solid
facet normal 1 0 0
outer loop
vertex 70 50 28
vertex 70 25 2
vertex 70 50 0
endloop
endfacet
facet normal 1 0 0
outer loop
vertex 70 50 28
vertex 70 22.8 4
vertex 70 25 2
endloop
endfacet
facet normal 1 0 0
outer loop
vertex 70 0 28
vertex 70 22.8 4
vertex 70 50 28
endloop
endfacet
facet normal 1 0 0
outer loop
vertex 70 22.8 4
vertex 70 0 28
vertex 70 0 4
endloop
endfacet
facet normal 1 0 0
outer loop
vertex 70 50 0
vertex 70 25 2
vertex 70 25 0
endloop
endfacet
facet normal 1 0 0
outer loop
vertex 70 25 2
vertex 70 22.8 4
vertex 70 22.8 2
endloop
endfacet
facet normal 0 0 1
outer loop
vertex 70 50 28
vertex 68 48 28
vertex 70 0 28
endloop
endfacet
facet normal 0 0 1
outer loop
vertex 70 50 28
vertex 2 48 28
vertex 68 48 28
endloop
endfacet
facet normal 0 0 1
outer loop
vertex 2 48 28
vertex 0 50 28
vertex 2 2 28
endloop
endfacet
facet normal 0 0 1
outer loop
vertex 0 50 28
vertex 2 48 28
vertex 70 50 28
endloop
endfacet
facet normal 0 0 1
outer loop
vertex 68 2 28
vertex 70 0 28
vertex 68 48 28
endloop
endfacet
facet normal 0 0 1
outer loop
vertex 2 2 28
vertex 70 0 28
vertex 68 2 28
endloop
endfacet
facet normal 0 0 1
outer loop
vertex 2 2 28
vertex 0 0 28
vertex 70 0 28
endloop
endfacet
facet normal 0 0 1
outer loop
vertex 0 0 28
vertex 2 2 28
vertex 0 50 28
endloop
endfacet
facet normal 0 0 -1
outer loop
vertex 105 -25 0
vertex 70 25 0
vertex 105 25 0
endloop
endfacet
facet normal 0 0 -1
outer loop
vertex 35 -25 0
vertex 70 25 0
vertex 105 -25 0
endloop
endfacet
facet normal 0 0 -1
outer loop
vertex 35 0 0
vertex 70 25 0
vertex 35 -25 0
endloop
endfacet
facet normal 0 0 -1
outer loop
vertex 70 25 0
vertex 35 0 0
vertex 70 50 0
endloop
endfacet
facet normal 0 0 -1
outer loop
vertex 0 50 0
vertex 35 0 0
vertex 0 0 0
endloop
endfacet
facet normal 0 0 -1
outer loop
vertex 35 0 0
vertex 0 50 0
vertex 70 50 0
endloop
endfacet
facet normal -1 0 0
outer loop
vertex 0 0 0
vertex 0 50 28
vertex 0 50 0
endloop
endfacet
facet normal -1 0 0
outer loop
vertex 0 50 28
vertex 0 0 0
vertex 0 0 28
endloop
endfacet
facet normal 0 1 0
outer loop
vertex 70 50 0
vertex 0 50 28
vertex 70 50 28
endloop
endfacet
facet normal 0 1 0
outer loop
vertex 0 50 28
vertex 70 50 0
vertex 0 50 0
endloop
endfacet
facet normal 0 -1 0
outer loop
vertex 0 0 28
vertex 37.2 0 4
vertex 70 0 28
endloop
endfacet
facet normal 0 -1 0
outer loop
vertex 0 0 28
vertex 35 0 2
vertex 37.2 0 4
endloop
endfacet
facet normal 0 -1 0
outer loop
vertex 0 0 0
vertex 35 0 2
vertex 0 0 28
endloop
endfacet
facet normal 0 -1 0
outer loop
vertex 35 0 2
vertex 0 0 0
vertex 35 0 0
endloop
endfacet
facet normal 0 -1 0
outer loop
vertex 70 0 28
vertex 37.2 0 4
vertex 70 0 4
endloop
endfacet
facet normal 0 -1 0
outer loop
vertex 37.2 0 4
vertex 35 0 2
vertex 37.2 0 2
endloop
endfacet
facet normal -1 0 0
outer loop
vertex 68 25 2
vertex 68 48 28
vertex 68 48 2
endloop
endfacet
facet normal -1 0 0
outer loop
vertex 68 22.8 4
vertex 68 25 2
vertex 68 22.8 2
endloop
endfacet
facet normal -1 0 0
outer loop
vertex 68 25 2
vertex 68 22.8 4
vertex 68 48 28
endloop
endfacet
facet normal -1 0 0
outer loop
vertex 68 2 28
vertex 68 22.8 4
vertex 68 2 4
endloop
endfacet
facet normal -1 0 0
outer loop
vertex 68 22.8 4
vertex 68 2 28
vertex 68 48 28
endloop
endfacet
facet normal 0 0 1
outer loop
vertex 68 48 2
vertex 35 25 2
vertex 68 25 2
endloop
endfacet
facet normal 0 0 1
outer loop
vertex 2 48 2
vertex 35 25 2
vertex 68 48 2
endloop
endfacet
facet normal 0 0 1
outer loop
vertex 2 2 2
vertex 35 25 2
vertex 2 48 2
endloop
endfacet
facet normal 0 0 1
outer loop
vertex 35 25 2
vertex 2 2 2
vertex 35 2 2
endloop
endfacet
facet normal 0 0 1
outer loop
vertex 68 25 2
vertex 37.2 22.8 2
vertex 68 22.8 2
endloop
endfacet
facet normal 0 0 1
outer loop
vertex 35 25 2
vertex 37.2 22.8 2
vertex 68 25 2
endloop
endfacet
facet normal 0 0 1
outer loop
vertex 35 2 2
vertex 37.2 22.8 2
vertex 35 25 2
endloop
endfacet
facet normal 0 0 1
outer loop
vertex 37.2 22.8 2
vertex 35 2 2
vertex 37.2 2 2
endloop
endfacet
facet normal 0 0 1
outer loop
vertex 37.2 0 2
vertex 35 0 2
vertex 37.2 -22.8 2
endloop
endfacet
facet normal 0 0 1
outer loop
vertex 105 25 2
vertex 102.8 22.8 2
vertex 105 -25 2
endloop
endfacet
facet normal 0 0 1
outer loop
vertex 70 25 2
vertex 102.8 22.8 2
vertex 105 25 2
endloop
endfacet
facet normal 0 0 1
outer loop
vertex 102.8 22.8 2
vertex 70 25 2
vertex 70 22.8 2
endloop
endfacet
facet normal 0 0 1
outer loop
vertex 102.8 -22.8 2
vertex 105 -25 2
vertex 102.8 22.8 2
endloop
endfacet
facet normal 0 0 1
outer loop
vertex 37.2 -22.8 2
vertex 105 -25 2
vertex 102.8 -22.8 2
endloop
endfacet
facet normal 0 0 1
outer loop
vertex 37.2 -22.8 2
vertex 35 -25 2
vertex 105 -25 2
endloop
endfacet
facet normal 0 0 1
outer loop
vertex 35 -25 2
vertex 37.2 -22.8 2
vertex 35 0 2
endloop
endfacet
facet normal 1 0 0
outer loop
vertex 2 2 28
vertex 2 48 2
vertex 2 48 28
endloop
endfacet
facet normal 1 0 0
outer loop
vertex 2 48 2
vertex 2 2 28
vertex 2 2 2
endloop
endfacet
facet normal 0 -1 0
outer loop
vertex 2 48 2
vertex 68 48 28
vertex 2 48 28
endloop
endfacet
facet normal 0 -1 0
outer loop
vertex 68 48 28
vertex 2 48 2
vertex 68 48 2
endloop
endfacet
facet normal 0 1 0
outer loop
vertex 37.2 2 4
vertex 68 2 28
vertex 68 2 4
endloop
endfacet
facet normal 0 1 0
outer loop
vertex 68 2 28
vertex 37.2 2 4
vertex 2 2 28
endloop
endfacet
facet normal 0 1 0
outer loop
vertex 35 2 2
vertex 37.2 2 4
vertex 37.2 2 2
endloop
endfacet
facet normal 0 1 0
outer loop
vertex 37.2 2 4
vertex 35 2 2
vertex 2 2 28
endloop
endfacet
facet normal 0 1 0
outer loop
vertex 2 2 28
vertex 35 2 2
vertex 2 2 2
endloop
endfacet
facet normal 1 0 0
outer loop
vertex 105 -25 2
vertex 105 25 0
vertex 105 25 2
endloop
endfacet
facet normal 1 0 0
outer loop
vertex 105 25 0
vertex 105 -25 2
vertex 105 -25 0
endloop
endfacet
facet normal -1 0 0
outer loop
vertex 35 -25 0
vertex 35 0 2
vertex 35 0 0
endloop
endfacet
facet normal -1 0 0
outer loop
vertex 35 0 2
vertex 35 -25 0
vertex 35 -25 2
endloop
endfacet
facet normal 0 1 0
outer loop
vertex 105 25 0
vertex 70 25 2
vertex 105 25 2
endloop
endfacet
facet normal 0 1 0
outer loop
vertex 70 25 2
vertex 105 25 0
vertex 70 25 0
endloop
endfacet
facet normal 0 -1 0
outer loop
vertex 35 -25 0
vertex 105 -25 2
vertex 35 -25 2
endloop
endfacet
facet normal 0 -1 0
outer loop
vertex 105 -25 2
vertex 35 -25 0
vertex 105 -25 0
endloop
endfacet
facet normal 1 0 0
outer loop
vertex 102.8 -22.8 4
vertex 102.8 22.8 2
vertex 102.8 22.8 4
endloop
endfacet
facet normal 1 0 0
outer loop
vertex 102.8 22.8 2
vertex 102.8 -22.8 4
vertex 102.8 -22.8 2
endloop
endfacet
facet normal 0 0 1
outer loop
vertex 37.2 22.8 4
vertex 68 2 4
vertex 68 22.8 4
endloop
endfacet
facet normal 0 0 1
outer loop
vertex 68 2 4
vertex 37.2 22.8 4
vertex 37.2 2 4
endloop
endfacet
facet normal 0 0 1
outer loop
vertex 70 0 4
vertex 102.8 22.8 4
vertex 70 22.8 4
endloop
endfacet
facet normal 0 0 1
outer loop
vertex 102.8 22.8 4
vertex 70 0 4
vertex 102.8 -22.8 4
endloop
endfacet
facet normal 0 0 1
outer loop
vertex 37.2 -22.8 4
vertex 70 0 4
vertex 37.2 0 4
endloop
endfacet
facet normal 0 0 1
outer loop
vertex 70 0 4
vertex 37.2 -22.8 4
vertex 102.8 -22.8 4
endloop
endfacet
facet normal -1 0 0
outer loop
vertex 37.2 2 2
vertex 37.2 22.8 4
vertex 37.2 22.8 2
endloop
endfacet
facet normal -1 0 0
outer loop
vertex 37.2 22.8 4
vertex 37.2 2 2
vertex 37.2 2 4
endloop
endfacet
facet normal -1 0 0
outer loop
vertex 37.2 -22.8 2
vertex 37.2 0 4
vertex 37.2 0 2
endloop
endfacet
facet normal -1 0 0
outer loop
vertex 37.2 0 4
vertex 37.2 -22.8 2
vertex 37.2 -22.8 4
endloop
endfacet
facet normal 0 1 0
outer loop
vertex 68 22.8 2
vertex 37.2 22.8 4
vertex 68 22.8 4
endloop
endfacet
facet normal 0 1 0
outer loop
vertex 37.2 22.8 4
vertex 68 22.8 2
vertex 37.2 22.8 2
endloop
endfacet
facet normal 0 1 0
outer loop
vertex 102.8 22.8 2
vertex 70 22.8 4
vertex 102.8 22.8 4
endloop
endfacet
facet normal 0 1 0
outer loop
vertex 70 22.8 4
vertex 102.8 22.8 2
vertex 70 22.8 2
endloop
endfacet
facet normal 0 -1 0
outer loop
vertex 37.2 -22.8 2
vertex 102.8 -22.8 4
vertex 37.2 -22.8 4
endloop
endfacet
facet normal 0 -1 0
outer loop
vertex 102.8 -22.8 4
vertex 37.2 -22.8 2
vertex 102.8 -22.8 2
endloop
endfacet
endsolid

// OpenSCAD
// Two-part enclosure for a small electronics board (e.g. Arduino-based temperature logger)
// Print orientation: box standing on its floor, lid printed upside down on the +X side.
// Both parts are in the same file, side by side on the bed, with a 10 mm gap between them.

// ---------------- Parameters ----------------
box_x      = 70;    // box outer length (X)
box_y      = 50;    // box outer width (Y)
box_z      = 30;    // box outer height (Z)
wall       = 2;     // box wall thickness
floor      = 2;     // box floor thickness (separate from walls for clarity)

lip_t      = 1.5;   // lid wall thickness
lip_h      = 4;     // lid wall height (extends above the 2 mm plate)
lip_x      = 65.6;  // lid outer length (X), 4.4 mm clearance inside box
lip_y      = 45.6;  // lid outer width (Y), 4.4 mm clearance inside box
plate      = 70;    // lid plate length (X)
plate_w    = 50;    // lid plate width (Y)

eps        = 0.5;   // cutter overshoot past faces

$fn = 64;

// ---------------- Model ----------------
union() {
    // Part 1: Box (open top)
    difference() {
        cube([box_x, box_y, box_z - floor]);   // outer shell above floor
        translate([wall, wall, floor])
            cube([box_x - 2 * wall, box_y - 2 * wall, box_z - floor + 0.01]); // hollow, open top
    }

    // Part 2: Lid (printed upside down: plate on bed, lip pointing up)
    union() {
        translate([plate - 70 / 2, -plate_w / 2, 0])
            cube([plate, plate_w, 2]);                      // base plate
        translate([plate - lip_x / 2, -lip_y / 2, 0])
            cube([lip_x, lip_y, lip_h]);                    // lip/overhang (65.6 x 45.6, 4 mm tall)
    }
}
